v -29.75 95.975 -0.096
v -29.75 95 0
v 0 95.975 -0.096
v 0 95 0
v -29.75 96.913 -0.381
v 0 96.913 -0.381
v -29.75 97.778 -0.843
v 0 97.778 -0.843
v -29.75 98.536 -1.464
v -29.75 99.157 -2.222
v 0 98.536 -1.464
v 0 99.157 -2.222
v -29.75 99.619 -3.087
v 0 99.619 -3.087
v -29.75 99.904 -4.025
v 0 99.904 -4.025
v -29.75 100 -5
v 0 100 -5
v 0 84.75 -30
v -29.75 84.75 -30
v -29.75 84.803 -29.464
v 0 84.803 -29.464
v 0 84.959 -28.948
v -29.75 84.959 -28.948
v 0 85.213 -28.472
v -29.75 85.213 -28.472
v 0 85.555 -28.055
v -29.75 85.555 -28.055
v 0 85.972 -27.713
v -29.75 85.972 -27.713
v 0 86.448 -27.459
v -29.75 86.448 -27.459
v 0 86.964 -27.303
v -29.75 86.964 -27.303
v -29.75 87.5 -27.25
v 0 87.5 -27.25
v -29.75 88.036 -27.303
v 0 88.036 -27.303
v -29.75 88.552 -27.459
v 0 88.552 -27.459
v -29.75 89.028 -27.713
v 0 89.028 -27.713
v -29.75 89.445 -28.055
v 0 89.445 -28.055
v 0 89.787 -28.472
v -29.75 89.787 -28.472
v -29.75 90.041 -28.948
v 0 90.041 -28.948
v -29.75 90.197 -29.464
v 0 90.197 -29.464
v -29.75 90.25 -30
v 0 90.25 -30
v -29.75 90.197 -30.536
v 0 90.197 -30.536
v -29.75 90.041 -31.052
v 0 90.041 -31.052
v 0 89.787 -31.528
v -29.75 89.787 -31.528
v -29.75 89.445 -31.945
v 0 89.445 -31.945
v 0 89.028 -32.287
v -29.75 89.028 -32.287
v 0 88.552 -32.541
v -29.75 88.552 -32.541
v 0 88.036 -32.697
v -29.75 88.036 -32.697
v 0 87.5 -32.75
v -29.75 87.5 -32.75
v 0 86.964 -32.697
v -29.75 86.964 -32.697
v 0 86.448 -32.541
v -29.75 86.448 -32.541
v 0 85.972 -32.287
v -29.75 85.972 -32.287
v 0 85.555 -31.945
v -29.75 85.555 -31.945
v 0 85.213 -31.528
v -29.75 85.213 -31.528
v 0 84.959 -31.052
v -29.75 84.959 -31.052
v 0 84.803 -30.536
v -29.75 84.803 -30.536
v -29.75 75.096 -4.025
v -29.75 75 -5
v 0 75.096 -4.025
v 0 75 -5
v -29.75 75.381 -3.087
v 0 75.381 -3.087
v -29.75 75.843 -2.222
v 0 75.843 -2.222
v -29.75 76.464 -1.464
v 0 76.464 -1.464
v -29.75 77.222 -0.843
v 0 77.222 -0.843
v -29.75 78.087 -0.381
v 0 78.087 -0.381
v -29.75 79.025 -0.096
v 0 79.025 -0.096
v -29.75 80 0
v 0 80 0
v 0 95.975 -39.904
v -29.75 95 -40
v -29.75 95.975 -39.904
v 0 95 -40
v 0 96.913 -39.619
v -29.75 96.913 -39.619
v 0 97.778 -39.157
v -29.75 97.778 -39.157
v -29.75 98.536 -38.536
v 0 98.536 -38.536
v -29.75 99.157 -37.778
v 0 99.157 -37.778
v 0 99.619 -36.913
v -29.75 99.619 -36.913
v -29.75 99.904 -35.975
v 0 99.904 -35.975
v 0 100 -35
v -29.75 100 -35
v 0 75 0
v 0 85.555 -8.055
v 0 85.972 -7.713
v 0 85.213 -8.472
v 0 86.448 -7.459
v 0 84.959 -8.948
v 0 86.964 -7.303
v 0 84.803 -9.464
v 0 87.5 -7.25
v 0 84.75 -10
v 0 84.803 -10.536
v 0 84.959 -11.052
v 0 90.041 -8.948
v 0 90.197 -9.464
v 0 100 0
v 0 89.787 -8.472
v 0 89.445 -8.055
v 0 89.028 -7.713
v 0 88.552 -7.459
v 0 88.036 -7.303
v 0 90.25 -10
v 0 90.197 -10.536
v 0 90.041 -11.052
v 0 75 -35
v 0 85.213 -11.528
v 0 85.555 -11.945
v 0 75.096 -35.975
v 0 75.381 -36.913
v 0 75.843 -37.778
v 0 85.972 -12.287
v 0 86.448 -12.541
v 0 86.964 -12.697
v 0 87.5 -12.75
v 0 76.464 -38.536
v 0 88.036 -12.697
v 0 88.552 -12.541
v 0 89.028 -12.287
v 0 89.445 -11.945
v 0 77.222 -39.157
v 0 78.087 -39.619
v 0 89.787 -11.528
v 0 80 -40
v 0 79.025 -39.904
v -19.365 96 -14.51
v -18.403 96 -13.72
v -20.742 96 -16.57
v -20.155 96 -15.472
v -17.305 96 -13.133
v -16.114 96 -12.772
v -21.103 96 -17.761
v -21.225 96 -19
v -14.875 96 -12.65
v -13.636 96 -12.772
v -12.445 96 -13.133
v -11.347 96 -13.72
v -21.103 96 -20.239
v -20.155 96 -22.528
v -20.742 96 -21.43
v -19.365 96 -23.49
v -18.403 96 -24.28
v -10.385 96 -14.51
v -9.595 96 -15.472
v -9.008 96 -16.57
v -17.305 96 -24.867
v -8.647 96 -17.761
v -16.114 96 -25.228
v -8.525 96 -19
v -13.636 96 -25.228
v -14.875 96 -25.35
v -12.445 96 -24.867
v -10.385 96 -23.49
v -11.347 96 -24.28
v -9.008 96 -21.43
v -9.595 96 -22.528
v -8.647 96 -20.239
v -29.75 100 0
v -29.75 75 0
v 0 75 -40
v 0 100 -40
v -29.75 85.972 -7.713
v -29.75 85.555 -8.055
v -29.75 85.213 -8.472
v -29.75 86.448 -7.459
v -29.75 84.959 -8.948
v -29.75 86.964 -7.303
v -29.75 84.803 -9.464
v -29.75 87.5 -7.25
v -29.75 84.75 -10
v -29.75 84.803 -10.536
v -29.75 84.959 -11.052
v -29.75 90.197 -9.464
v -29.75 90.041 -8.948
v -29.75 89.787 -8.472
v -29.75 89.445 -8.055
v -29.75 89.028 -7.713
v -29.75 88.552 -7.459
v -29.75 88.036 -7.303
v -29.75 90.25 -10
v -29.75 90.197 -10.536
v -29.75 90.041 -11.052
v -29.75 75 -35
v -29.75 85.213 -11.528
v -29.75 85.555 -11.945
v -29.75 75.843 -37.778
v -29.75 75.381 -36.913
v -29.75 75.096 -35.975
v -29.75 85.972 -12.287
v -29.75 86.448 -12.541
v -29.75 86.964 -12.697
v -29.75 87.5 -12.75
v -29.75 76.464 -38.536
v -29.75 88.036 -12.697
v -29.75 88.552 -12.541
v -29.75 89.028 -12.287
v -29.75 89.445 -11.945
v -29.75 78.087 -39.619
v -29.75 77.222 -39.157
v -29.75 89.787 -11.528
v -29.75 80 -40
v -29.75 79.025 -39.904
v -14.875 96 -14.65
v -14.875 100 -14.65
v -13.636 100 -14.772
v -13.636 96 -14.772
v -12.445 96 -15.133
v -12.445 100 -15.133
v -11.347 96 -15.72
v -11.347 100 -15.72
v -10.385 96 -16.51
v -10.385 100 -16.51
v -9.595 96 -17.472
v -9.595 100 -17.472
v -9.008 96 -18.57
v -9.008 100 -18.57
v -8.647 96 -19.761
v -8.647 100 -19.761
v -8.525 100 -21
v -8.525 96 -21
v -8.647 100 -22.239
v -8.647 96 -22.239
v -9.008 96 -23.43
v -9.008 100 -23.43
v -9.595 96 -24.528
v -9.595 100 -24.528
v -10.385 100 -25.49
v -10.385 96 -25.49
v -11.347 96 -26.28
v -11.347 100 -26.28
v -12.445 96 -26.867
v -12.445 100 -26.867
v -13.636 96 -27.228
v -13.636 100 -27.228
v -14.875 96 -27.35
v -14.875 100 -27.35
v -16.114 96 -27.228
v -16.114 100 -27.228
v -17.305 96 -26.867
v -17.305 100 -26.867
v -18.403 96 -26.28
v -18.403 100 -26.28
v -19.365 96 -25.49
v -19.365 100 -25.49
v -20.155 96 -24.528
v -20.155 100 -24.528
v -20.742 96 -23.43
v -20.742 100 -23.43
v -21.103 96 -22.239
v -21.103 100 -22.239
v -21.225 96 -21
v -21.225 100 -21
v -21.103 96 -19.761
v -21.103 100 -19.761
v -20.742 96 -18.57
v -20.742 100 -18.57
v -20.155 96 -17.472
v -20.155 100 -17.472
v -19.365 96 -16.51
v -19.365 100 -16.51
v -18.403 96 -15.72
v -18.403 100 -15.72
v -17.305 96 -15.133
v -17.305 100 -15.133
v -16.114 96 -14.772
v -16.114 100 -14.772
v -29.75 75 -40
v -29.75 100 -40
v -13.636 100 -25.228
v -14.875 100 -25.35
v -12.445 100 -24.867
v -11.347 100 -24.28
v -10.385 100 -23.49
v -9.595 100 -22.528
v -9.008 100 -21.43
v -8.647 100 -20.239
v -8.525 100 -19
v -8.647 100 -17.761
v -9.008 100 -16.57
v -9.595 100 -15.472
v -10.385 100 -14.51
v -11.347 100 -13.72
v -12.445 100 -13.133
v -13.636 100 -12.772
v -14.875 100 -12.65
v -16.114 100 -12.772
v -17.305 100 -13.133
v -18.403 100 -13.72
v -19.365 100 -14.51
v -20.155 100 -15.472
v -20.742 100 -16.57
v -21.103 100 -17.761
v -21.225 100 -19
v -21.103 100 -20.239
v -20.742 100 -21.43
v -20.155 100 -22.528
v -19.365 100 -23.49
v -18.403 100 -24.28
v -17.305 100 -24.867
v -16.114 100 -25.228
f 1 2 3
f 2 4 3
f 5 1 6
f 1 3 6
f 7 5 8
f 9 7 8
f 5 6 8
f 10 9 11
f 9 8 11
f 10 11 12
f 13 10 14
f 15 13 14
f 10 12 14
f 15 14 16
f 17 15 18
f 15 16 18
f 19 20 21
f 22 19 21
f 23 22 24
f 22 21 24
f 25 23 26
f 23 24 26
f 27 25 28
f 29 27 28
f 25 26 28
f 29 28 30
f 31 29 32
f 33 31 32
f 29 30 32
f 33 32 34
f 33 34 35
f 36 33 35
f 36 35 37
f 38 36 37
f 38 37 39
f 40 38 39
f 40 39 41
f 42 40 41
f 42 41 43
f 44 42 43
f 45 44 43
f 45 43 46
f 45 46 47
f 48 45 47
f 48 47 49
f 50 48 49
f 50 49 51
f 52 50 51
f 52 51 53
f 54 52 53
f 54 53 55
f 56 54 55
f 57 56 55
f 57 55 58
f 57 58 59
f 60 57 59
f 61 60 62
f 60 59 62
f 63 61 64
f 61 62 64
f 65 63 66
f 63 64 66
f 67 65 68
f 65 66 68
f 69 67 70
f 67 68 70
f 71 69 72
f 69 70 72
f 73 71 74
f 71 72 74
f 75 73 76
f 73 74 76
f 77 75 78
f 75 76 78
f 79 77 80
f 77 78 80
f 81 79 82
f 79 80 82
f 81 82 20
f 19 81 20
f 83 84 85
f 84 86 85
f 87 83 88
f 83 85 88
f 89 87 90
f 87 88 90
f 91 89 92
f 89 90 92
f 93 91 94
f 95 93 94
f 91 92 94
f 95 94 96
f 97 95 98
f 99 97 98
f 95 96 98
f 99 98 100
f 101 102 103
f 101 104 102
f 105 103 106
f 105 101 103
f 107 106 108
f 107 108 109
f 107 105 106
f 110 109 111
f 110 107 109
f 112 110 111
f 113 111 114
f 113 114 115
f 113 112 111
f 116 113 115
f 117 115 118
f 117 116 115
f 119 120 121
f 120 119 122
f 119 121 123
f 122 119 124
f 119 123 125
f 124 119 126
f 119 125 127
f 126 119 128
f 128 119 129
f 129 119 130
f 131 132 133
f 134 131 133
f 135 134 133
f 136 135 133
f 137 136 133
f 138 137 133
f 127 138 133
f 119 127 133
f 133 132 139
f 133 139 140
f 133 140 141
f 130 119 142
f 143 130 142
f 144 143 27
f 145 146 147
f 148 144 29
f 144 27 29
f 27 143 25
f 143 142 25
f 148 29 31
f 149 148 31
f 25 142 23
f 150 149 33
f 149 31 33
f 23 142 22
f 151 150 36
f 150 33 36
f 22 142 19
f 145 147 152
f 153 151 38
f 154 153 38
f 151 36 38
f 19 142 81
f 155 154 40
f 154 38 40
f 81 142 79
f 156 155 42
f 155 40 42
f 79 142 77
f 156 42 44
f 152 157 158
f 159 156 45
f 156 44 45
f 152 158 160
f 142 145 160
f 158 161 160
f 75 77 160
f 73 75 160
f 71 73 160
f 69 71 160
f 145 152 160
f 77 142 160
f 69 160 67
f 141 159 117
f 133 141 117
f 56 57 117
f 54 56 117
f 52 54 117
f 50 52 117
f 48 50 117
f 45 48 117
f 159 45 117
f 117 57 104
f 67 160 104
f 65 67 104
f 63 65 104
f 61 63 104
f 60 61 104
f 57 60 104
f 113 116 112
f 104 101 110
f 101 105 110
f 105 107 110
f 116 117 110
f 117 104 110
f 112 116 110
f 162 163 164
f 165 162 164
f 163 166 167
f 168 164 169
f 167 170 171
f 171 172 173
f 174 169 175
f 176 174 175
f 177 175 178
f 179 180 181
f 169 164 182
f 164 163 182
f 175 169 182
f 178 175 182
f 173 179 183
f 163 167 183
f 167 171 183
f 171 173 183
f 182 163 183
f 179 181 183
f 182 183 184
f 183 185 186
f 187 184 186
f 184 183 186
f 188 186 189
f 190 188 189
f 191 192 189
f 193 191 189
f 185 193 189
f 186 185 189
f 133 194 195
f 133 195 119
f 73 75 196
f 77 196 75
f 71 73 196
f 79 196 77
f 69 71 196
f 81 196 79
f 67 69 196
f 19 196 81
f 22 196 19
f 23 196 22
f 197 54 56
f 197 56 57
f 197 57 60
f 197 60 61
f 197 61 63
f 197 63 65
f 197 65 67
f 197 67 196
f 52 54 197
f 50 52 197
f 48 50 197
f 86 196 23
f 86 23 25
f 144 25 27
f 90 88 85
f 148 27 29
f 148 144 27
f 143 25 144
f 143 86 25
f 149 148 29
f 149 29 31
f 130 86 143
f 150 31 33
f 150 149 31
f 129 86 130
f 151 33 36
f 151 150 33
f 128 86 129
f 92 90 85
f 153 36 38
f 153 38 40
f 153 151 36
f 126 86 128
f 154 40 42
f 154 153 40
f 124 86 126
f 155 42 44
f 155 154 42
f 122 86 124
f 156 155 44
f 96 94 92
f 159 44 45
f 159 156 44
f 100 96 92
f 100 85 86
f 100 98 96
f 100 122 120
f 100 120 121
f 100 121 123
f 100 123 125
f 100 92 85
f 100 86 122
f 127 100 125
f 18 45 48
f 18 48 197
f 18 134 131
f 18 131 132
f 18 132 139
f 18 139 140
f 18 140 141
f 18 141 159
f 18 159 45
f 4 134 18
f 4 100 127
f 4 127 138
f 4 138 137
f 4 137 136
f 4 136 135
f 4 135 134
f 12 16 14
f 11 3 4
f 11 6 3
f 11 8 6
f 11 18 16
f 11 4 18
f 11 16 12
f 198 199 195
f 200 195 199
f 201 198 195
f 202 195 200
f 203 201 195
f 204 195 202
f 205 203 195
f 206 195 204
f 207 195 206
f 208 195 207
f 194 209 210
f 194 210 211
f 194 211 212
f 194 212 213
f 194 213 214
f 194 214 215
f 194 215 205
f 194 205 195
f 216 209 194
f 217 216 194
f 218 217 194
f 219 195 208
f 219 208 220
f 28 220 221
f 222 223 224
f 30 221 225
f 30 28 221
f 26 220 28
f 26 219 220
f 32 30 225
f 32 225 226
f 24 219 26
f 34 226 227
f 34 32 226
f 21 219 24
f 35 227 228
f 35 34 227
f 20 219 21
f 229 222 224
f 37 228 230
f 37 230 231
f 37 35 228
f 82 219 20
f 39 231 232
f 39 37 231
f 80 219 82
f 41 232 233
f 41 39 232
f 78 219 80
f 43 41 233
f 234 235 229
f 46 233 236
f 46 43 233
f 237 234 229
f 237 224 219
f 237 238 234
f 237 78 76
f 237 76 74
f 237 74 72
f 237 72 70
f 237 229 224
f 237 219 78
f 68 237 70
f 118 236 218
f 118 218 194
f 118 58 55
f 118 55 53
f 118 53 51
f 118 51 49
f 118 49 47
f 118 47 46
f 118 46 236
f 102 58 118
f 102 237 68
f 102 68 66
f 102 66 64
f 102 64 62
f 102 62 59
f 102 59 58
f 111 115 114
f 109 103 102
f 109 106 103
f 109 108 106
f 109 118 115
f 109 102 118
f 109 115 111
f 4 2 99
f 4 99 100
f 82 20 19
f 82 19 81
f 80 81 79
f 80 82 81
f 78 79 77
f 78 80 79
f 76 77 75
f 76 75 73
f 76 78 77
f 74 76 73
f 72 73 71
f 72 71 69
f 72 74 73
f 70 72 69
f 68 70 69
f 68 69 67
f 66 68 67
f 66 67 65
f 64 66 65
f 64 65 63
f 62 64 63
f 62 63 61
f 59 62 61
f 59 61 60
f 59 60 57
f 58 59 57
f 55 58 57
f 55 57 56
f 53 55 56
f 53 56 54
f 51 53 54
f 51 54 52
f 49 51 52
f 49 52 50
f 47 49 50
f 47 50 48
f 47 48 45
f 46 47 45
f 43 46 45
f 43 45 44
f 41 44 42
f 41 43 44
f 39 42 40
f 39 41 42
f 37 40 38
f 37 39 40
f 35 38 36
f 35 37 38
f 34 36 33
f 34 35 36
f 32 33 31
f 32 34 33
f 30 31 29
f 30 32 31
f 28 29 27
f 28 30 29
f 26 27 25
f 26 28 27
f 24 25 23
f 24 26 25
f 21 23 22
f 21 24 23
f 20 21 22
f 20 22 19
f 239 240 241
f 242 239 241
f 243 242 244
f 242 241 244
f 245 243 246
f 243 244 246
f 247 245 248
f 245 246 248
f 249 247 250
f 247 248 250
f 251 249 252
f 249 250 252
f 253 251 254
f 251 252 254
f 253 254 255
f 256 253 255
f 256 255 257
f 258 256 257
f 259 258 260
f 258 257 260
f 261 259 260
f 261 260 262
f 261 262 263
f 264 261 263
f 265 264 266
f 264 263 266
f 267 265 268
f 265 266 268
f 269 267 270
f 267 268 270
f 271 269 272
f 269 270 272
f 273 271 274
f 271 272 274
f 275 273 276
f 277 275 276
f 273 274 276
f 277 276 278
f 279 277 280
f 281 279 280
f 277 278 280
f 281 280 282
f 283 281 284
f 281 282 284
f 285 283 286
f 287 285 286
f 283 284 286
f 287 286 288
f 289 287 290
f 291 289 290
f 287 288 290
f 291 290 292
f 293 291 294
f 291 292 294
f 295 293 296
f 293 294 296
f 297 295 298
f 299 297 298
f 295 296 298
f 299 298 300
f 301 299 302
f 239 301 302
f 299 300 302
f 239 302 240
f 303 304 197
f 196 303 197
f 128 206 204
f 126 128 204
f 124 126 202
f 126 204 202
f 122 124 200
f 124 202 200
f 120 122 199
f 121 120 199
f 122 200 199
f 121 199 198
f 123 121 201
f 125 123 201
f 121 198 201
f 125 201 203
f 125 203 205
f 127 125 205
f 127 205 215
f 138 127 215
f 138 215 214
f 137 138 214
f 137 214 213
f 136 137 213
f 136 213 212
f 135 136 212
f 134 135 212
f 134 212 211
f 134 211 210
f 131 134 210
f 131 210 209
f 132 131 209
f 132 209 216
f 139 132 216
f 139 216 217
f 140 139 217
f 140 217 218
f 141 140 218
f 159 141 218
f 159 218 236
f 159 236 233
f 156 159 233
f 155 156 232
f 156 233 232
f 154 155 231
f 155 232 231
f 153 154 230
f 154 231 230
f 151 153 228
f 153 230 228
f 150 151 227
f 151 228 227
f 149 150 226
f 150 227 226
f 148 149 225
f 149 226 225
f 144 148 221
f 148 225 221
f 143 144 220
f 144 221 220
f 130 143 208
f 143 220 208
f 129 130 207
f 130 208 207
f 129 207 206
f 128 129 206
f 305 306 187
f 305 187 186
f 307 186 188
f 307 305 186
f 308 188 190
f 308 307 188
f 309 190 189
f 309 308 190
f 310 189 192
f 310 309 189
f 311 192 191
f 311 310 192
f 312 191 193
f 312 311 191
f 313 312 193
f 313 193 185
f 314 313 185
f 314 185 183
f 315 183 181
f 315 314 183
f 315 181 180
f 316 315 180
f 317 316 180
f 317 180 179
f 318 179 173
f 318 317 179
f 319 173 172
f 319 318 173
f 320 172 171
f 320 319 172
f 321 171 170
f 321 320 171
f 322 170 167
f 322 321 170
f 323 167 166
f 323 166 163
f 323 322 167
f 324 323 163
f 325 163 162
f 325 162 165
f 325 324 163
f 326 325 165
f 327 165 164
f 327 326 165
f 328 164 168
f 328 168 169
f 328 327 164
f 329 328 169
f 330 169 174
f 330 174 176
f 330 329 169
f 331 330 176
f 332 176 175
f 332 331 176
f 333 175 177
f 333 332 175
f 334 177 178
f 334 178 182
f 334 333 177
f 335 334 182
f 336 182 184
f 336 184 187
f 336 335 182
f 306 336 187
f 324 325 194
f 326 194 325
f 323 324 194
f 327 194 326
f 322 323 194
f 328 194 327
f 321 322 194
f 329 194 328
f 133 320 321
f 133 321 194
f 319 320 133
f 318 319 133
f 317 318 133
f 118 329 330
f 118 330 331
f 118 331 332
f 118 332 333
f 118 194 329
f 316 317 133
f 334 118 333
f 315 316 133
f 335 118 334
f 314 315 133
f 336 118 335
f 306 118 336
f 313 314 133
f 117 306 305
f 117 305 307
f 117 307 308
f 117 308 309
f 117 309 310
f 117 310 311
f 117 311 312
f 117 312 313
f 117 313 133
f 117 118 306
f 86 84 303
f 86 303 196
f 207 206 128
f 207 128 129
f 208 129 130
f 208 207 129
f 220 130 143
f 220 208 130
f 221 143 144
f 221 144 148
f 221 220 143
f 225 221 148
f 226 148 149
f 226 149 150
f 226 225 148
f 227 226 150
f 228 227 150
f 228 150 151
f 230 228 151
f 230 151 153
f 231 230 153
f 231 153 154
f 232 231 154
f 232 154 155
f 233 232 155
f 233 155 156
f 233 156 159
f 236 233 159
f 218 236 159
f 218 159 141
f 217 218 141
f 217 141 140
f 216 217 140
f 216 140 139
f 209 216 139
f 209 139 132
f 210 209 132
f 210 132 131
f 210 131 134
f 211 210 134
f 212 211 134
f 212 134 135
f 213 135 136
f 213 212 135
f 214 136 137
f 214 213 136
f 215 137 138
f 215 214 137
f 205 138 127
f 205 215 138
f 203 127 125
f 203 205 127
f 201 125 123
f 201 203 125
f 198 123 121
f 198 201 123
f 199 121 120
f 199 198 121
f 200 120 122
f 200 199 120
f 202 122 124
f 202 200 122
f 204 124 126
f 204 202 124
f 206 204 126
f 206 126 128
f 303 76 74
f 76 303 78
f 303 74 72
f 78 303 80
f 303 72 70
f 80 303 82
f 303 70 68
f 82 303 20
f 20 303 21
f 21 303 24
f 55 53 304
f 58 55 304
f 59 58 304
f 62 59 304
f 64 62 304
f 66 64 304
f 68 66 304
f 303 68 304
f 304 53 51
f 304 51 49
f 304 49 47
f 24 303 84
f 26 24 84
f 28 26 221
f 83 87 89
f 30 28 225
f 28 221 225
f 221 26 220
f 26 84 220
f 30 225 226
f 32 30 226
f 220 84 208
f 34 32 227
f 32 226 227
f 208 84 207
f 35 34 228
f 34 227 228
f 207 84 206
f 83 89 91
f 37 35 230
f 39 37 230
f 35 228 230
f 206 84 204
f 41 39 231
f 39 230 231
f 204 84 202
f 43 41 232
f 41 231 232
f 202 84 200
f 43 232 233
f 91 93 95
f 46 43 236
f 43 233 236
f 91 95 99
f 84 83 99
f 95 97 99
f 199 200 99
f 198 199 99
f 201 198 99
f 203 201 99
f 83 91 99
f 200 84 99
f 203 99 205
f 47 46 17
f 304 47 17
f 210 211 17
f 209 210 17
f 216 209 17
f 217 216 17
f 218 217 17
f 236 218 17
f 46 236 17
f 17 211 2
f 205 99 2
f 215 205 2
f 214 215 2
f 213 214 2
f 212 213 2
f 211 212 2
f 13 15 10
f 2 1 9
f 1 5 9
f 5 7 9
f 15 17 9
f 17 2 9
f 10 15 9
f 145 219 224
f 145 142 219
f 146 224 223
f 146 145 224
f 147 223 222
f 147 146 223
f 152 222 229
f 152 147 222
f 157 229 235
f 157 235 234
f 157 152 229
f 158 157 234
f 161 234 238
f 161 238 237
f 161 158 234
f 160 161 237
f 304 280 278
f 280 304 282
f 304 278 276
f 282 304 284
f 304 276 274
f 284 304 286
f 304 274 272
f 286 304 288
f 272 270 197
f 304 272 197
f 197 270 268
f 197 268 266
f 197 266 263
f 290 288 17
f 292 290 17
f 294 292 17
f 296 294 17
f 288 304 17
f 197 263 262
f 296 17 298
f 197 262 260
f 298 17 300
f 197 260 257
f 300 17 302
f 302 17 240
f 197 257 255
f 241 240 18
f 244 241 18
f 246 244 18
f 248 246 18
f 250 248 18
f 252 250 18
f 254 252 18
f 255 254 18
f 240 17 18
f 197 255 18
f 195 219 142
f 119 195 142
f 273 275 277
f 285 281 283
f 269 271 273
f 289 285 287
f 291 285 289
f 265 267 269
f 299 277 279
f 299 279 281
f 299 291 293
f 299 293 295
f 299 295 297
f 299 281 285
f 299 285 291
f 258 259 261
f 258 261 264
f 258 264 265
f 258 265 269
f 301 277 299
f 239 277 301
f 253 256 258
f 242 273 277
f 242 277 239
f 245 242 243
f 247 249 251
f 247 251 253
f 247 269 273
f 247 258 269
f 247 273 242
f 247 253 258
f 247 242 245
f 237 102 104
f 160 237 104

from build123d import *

# Parameters (mm, degrees)
ESQUISSE2_W             = 29.75
ESQUISSE2_H             = 25
BOSS_EXTRU_1_DEPTH      = 40
ESQUISSE3_R             = 6.35
ENL_V_MAT_EXTRU_1_DEPTH = 4
D_GAGEMENT_M51_D        = 5.5
CONG_1_R                = 5


with BuildPart() as part:
    # Esquisse2 → Boss.-Extru.1 (new body)
    with BuildSketch(Plane.XY):
        with Locations((-14.875, 87.5)):
            Rectangle(ESQUISSE2_W, ESQUISSE2_H)
    extrude(amount=-BOSS_EXTRU_1_DEPTH)

    # Esquisse3 → Enlèv. mat.-Extru.1 (cut)
    with BuildSketch(Plane(origin=(0, 100, 0), x_dir=(1, 0, 0), z_dir=(0, 1, 0))):
        with Locations(Location((-14.875, 21, 0), (0, 0, 270))):
            Circle(ESQUISSE3_R)
    extrude(amount=-ENL_V_MAT_EXTRU_1_DEPTH, mode=Mode.SUBTRACT)

    # Dégagement M51 (through all)
    with Locations(Plane(origin=(0, 87.5, -10), x_dir=(0, 1, 0), z_dir=(1, 0, 0))):
        with Locations((0, 0), (0, -20)):
            Hole(D_GAGEMENT_M51_D / 2)

    # Congé1
    cong_1_edges = [part.edges().sort_by_distance(p)[0] for p in [
        (-14.875, 75, 0),
        (-14.875, 100, 0),
    ]]
    fillet(cong_1_edges, radius=CONG_1_R)


with BuildPart() as body_2:
    # Symétrie1: mirrored copy
    add(part.part.mirror(Plane.XY.offset(-20)))


solid = Compound([part.part, body_2.part])
